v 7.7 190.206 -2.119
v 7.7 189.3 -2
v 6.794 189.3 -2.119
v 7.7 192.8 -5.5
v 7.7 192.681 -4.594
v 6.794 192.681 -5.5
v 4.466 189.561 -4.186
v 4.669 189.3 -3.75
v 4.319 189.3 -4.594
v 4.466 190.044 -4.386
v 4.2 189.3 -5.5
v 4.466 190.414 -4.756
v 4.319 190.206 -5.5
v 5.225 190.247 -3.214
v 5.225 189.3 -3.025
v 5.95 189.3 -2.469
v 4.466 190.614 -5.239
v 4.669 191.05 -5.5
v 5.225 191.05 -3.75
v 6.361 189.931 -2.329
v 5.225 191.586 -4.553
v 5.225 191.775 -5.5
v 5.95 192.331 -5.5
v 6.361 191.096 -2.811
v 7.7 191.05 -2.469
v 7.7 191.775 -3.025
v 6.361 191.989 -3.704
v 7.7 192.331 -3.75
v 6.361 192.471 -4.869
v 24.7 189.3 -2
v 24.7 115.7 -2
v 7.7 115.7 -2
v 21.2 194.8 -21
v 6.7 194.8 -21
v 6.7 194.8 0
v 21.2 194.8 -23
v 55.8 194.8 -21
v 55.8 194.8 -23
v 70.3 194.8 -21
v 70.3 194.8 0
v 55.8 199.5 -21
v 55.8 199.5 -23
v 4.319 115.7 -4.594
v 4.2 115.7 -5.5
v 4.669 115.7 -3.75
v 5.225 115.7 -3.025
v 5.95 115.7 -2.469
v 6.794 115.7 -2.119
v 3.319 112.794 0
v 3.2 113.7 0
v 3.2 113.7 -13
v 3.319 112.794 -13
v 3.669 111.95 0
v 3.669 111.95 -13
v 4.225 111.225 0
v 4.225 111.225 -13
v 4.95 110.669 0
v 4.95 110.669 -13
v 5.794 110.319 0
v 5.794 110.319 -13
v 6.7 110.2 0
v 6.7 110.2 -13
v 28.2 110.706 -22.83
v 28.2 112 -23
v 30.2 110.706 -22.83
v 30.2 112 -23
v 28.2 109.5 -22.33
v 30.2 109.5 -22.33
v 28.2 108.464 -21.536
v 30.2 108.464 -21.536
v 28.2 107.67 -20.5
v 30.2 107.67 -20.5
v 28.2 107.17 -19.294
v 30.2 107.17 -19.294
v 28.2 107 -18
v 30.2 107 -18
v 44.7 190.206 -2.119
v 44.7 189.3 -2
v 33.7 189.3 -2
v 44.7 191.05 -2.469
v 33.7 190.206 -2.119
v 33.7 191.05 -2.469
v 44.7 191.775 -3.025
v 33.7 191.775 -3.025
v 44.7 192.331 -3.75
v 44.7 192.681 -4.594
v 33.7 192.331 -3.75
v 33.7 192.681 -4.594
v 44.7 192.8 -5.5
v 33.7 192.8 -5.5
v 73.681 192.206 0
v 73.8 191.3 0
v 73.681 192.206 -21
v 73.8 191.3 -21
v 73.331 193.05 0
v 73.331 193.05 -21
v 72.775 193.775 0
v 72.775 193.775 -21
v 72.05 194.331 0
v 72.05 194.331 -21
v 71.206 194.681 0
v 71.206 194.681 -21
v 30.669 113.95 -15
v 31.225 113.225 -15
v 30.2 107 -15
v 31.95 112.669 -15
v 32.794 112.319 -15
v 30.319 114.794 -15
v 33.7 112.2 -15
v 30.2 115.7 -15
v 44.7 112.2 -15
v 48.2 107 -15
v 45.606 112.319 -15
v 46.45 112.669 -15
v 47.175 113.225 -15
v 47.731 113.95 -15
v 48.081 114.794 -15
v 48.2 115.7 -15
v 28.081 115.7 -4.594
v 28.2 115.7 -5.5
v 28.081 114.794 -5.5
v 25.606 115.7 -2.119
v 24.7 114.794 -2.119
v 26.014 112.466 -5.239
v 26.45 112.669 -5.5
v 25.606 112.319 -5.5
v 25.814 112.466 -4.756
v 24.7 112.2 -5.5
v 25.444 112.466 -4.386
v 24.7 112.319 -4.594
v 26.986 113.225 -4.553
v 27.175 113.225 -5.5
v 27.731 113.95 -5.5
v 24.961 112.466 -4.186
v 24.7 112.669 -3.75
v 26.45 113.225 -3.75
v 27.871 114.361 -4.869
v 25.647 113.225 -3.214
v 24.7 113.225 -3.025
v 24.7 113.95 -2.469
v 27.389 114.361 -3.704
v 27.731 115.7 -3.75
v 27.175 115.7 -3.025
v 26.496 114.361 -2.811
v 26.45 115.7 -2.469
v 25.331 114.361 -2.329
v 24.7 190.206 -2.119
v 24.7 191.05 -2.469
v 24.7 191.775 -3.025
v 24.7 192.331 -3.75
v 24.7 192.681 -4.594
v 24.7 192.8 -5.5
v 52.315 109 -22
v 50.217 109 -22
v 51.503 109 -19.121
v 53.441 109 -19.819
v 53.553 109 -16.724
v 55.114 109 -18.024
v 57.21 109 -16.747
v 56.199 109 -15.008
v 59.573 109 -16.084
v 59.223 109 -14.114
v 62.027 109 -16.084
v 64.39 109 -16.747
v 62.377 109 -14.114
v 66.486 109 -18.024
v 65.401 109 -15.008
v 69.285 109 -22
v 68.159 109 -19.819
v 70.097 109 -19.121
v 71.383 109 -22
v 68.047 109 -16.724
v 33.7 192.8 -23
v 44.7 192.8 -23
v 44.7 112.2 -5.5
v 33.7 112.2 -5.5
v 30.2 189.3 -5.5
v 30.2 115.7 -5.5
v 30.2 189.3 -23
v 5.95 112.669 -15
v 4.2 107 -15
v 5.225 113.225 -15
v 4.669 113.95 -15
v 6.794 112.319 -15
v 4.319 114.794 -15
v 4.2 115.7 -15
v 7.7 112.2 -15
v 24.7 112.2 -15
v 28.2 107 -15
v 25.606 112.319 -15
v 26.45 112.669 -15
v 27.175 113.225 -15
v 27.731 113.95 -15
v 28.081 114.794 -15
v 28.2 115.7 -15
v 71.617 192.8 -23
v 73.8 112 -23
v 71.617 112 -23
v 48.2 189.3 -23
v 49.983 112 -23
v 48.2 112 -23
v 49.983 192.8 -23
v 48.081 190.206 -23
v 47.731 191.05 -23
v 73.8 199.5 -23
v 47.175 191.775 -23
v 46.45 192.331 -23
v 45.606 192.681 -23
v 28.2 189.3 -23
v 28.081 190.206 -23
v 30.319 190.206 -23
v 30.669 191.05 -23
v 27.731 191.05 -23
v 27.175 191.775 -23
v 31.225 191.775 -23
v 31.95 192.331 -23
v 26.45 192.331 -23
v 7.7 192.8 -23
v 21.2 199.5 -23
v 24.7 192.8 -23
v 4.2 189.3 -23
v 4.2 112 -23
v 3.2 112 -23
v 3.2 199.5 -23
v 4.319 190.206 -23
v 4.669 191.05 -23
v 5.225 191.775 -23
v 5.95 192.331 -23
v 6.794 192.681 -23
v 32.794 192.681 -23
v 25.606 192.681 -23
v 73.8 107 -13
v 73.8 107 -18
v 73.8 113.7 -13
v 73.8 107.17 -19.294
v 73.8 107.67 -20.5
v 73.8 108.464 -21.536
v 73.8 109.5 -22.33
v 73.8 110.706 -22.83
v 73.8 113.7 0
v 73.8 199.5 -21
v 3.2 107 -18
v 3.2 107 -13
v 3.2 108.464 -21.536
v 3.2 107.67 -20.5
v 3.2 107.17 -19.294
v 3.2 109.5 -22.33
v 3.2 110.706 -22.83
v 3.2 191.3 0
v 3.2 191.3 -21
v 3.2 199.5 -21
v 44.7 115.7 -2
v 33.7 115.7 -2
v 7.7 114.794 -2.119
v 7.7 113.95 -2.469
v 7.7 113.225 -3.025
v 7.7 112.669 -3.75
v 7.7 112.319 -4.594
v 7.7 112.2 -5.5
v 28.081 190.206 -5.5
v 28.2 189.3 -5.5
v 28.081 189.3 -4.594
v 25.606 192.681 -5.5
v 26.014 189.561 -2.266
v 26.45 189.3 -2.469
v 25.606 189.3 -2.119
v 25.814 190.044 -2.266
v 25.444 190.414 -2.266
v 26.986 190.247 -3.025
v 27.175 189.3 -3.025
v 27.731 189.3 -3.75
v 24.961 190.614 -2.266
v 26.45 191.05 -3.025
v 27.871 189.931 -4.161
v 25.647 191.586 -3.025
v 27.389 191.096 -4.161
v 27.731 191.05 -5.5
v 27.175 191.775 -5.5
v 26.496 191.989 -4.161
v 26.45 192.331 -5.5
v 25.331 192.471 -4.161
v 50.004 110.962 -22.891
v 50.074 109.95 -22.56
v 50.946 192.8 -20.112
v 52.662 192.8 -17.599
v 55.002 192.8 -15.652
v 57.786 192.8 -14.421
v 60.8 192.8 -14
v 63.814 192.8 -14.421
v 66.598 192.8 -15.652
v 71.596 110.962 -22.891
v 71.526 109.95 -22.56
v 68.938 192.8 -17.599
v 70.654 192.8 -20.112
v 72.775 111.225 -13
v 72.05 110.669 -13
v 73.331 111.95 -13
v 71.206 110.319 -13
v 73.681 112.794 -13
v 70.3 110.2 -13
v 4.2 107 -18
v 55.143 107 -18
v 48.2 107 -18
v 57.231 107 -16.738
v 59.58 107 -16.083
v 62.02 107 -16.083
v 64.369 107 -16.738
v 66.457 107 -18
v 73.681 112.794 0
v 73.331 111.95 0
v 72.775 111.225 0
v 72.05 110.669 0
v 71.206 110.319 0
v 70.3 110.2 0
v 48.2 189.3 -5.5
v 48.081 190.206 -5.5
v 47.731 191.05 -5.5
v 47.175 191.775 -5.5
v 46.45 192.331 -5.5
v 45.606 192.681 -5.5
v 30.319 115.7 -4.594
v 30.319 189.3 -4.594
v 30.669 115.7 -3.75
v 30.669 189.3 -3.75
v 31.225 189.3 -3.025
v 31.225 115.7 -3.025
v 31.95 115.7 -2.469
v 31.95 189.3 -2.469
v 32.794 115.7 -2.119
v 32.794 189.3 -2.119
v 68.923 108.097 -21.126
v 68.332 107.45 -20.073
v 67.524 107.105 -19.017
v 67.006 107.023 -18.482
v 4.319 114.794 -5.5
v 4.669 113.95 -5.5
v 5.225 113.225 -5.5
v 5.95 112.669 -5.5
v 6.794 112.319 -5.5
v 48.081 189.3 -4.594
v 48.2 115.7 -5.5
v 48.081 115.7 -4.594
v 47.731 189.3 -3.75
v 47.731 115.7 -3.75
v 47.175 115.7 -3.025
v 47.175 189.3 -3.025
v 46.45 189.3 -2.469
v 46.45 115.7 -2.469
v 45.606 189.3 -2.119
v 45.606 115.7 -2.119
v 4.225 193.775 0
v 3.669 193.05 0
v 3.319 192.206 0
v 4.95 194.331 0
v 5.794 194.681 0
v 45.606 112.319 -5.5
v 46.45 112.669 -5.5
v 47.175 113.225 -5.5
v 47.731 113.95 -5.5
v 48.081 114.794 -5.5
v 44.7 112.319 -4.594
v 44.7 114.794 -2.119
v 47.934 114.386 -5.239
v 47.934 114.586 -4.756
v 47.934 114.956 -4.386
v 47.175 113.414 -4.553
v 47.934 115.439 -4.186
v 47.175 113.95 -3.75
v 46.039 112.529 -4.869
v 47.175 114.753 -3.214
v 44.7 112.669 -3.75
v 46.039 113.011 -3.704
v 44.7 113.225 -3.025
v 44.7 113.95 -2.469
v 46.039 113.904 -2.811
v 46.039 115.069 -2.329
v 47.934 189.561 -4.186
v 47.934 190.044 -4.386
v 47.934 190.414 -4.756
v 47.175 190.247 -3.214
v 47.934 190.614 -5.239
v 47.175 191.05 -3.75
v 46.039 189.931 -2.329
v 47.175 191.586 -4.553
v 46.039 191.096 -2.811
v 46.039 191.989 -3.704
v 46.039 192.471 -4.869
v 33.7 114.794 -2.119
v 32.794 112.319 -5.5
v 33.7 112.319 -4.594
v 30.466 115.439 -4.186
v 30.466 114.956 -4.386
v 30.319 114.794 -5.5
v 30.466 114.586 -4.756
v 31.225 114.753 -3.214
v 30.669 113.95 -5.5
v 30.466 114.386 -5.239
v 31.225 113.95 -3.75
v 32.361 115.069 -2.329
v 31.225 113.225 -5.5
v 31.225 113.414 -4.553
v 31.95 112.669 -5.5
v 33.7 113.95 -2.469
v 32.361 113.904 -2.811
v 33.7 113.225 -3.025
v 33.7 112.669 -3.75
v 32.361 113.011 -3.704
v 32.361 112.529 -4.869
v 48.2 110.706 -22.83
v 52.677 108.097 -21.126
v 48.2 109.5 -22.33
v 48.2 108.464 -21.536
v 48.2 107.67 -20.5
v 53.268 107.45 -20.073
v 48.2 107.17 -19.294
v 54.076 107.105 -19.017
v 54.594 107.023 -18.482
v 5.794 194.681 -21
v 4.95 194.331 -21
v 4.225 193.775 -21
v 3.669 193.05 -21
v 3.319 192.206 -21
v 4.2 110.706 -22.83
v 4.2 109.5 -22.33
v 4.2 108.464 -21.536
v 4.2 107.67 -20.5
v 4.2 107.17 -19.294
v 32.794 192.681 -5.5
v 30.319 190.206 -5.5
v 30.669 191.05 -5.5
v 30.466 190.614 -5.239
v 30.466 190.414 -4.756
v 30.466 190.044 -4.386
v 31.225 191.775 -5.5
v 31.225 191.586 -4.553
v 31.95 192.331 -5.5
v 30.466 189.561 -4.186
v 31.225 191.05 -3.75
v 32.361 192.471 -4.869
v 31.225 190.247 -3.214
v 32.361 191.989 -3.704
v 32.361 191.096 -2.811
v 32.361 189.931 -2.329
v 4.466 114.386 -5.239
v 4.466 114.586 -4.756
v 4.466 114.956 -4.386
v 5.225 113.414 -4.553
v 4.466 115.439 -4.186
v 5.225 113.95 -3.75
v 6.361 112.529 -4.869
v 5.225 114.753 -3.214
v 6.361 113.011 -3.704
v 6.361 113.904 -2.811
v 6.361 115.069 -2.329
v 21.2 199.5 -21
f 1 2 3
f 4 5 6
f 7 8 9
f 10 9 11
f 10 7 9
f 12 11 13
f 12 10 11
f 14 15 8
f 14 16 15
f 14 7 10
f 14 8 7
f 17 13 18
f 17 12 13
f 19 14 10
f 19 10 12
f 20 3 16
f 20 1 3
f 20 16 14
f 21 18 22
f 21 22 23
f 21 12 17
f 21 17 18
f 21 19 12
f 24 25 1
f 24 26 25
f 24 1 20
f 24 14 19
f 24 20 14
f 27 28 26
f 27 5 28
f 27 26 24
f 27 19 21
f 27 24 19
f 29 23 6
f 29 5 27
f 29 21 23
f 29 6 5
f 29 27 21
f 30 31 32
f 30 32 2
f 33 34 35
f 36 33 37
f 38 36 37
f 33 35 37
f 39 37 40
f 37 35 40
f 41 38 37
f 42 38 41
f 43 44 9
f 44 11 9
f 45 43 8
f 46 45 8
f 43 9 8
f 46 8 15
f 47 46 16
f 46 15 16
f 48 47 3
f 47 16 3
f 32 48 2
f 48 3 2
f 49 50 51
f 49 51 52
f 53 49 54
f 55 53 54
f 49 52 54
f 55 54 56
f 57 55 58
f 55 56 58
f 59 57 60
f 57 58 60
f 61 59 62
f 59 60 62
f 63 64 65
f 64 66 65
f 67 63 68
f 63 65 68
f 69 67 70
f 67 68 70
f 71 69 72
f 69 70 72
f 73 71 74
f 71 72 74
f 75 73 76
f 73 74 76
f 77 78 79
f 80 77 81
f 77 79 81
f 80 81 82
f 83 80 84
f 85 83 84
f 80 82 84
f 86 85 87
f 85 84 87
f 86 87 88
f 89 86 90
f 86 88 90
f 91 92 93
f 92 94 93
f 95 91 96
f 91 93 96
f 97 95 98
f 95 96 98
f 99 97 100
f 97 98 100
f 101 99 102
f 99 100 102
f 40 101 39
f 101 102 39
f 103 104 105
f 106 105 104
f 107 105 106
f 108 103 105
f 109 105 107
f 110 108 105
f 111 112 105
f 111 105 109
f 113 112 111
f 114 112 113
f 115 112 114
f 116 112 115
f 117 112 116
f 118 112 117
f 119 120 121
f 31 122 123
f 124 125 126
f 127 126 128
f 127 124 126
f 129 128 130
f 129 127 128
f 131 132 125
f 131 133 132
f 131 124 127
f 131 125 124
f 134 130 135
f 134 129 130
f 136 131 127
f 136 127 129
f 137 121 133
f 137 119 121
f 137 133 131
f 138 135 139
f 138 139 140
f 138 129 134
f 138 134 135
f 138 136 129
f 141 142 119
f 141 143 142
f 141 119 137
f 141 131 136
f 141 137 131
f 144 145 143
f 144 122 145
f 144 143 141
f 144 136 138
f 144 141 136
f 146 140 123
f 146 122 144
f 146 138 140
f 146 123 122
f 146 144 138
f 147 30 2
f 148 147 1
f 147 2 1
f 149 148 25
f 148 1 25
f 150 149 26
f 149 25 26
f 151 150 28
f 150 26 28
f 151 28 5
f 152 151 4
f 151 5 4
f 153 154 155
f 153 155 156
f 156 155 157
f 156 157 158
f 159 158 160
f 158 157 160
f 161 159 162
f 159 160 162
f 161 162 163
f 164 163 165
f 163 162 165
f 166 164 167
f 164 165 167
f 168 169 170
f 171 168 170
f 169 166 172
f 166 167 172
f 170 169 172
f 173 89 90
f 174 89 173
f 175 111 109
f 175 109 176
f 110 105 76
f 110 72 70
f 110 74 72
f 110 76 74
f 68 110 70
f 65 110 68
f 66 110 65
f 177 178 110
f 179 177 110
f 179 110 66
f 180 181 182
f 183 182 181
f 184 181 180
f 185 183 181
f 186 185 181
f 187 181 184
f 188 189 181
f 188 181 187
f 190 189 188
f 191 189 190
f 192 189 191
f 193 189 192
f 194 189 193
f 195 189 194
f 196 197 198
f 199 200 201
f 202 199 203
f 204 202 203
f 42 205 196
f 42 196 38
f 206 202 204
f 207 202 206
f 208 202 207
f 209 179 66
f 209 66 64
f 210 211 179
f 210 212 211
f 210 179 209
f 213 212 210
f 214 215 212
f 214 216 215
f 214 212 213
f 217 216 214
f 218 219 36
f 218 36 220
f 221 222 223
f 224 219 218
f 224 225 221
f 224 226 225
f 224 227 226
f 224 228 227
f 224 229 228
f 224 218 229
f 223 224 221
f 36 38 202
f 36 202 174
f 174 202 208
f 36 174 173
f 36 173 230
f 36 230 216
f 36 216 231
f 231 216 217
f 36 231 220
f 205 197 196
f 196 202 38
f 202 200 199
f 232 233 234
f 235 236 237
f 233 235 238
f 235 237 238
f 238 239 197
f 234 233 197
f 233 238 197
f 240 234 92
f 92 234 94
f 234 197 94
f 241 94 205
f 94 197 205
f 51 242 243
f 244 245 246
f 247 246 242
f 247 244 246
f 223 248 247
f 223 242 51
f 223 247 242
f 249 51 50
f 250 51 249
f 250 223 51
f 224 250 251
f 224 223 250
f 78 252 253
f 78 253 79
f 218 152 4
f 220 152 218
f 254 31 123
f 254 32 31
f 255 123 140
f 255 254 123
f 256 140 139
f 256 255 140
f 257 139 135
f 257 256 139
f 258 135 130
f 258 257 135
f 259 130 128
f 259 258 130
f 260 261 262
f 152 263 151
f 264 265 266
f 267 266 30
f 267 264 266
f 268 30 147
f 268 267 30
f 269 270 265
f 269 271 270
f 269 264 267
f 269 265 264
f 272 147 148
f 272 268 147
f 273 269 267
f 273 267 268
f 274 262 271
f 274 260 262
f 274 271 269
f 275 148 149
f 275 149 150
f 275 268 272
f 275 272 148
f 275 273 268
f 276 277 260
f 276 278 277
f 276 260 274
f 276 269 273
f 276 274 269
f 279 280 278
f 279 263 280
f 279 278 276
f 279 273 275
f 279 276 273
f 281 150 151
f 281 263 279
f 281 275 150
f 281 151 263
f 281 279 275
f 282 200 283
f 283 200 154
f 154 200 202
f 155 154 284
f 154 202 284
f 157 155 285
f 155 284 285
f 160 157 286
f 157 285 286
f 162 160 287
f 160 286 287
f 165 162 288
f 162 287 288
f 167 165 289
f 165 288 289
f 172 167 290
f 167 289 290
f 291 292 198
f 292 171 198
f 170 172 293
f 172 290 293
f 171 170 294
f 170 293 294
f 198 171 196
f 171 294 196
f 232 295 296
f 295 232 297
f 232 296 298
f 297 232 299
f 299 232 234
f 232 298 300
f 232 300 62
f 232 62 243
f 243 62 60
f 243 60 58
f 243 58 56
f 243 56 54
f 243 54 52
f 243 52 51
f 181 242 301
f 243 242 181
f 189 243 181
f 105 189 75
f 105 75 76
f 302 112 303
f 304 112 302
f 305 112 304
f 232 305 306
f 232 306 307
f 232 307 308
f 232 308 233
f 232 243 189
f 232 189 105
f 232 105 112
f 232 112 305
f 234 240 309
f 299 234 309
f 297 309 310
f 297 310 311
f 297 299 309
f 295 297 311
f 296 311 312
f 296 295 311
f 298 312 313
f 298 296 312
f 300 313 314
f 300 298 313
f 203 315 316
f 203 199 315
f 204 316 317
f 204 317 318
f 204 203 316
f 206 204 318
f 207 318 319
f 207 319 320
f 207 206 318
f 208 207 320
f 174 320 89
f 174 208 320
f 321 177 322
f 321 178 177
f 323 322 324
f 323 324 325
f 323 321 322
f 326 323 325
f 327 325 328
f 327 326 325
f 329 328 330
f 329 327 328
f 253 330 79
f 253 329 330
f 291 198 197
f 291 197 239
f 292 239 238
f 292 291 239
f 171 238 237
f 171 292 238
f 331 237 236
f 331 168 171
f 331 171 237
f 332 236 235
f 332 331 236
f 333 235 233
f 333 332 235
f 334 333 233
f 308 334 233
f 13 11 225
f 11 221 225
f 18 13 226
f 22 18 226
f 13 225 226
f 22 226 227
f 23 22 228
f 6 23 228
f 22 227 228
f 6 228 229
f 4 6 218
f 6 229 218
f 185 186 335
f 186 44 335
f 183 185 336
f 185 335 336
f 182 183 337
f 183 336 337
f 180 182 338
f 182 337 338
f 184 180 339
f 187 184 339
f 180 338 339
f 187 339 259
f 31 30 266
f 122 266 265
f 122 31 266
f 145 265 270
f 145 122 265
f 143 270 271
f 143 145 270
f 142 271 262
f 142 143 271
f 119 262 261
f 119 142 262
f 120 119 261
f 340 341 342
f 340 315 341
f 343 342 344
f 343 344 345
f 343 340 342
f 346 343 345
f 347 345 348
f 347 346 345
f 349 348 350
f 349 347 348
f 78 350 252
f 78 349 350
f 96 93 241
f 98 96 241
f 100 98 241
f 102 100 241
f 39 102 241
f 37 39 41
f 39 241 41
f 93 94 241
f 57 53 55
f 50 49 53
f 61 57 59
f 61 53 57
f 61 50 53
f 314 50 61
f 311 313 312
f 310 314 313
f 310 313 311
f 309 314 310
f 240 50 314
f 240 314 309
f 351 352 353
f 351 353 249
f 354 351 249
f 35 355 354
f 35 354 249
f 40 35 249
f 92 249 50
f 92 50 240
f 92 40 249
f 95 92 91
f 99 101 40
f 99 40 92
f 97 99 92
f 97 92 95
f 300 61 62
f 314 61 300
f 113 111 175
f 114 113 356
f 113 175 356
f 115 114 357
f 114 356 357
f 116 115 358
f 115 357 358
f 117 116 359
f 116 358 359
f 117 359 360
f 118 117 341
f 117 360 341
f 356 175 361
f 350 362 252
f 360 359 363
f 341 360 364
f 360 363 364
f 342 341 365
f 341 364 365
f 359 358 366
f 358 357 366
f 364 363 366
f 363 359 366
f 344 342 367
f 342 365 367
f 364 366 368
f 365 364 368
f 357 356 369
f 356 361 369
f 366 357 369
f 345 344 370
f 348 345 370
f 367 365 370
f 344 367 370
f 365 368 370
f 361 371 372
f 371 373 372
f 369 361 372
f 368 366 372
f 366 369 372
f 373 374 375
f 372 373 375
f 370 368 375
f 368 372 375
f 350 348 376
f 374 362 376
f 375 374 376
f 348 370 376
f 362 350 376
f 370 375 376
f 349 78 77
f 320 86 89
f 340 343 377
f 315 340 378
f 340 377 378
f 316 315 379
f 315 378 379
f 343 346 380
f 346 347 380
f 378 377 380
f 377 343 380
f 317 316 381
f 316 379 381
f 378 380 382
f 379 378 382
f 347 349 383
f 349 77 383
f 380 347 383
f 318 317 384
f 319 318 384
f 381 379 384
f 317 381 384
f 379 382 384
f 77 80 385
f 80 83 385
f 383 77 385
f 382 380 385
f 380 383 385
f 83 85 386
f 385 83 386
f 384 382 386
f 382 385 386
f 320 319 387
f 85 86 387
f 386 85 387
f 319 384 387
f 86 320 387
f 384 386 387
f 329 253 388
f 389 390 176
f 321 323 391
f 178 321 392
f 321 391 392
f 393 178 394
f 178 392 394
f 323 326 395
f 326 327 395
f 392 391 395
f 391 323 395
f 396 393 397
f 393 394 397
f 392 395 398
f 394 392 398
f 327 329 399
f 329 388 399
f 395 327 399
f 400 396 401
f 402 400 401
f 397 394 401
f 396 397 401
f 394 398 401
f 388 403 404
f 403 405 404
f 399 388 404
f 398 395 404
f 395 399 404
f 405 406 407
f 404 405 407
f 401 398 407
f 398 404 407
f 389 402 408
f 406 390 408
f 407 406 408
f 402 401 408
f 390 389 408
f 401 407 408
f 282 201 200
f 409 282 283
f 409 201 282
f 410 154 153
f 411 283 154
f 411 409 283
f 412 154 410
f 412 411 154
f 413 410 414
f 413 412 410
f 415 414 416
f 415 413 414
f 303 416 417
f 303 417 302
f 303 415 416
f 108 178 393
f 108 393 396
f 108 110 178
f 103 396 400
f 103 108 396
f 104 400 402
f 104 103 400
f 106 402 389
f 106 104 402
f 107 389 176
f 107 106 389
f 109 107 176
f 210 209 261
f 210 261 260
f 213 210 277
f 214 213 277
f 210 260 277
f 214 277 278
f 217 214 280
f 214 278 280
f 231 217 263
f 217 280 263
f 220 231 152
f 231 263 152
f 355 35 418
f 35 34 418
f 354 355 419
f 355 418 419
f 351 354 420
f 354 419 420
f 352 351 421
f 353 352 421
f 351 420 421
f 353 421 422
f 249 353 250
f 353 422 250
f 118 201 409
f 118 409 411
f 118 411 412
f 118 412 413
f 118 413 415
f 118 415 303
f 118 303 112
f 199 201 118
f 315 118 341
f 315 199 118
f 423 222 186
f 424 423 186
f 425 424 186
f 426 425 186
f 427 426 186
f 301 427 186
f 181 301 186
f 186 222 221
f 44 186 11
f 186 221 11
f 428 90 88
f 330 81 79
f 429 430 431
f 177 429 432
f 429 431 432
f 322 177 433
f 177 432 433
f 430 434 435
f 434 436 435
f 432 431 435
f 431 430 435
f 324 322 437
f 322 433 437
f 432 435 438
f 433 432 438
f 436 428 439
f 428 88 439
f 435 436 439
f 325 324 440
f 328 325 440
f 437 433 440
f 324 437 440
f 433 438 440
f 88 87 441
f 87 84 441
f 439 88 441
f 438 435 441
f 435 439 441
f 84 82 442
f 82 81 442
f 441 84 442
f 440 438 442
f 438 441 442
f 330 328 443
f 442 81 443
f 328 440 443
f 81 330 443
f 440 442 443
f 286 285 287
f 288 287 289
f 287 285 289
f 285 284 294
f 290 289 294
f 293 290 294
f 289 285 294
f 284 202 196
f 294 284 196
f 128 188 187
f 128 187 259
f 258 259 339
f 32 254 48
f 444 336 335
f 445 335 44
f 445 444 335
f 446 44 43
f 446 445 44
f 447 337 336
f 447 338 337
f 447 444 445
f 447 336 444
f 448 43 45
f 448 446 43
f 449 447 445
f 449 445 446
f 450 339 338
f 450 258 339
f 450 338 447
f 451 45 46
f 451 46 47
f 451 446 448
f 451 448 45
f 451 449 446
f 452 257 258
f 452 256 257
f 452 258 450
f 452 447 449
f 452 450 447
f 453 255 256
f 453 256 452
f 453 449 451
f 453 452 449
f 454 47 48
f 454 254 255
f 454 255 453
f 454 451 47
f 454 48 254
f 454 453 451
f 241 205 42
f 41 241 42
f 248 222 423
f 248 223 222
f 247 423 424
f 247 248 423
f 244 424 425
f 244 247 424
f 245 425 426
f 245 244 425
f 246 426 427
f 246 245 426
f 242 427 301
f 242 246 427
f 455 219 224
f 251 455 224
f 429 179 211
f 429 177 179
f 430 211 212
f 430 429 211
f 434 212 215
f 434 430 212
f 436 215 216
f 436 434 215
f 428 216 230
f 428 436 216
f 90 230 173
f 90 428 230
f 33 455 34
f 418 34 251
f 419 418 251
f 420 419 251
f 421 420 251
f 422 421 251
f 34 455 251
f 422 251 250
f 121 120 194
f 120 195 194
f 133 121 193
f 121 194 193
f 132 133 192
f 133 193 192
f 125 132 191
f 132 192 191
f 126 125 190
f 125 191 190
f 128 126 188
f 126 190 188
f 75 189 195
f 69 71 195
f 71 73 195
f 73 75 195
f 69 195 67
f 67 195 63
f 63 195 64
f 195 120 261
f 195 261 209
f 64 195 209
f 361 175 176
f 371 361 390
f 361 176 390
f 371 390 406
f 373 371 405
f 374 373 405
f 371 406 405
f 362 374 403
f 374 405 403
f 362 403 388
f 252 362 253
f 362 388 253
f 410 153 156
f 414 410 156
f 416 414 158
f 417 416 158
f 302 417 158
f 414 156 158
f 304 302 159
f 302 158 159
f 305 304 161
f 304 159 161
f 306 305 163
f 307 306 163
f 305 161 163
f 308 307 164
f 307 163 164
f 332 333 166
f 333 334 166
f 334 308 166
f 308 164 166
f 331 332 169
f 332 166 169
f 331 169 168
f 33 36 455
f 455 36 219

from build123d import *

# Parameters (mm, degrees)
SKETCH_1_W               = 70.6
SKETCH_1_H               = 84.6
EXTRUDE_1_DEPTH          = 23
SKETCH_2_W               = 18
SKETCH_2_H               = 4.7
EXTRUDE_2_DEPTH          = 2
SKETCH_3_W               = 70.6
SKETCH_3_H               = 3.2
EXTRUDE_3_DEPTH          = 10
CUT_EXTRUDE_START        = -2
SKETCH_4_R               = 11
CUT_EXTRUDE_1_DEPTH      = 115.979827321
EXTRUDE_START            = -2
EXTRUDE_1_2_DEPTH        = 2
DELETE_START             = 107
DELETE_FACE_1_DEPTH      = 2
CUT_EXTRUDE_2_DEPTH      = 1
CUT_EXTRUDE_2_DEPTH_BACK = 43
CUT_EXTRUDE_2_START      = -2
EXTRUDE_START_2          = 24
EXTRUDE_4_DEPTH          = 2
FILLET_1_R               = 5
FILLET_2_R               = 3.5
FILLET_3_R               = 3.5


# Read off the part's stored shape, not the designer's step: 删除面1
with BuildPart() as part:
    # 草图1 → Extrude 1 (new body)
    with BuildSketch(Plane.XY):
        with Locations((38.5, 152.5)):
            Rectangle(SKETCH_1_W, SKETCH_1_H)
    extrude(amount=-EXTRUDE_1_DEPTH)

    # 草图2 → 凸台-拉伸2 (add)
    with BuildSketch(Plane(origin=(0, 0, -23), x_dir=(-1, 0, 0), z_dir=(0, 0, -1))):
        with Locations((-12.2, 197.15)):
            Rectangle(SKETCH_2_W, SKETCH_2_H)
        with Locations((-64.8, 197.15)):
            Rectangle(SKETCH_2_W, SKETCH_2_H)
    extrude(amount=-EXTRUDE_2_DEPTH)

    # 草图3 → 凸台-拉伸3 (add)
    with BuildSketch(Plane(origin=(0, 0, -23), x_dir=(-1, 0, 0), z_dir=(0, 0, -1))):
        with Locations((-38.5, 108.6)):
            Rectangle(SKETCH_3_W, SKETCH_3_H)
    extrude(amount=-EXTRUDE_3_DEPTH)

    # 草图4 → 切除-拉伸1 (cut, through all)
    with BuildSketch(Plane(origin=(0, 194.8, 0), x_dir=(1, 0, 0), z_dir=(0, 1, 0)).offset(CUT_EXTRUDE_START)):
        with Locations((60.8, 25)):
            Circle(SKETCH_4_R)
    extrude(amount=-CUT_EXTRUDE_1_DEPTH, mode=Mode.SUBTRACT)

    # 草图5 → Extrude 1 2 (add)
    with BuildSketch(Plane.XZ.offset(-107).offset(EXTRUDE_START)):
        with BuildLine():
            ThreePointArc((71.616653826, -23), (60.8, -14), (49.983346174, -23))
            Line((49.983346174, -23), (51.950010506, -23.363636364))
            ThreePointArc((51.950010506, -23.363636364), (60.8, -16), (69.649989494, -23.363636364))
            Line((69.649989494, -23.363636364), (71.616653826, -23))
        make_face()
    extrude(amount=EXTRUDE_1_2_DEPTH)

    # Delete Face 1 outline → Delete Face 1 (cut)
    with BuildSketch(Plane(origin=(0, 0, 0), x_dir=(1, 0, 0), z_dir=(0, 1, 0)).offset(DELETE_START)):
        with BuildLine():
            Line((49.983346174, 23), (52.025035613, 23))
            ThreePointArc((52.025035613, 23), (51.985647631, 23.181431245), (51.950010506, 23.363636364))
            Line((51.950010506, 23.363636364), (49.983346174, 23))
        make_face()
        with BuildLine():
            Line((71.616653826, 23), (69.649989494, 23.363636364))
            ThreePointArc((69.649989494, 23.363636364), (69.614352369, 23.181431245), (69.574964387, 23))
            Line((69.574964387, 23), (71.616653826, 23))
        make_face()
    extrude(amount=DELETE_FACE_1_DEPTH, mode=Mode.SUBTRACT)

    # 草图6 → 切除-拉伸2 (cut, two sides: drawn at the far end of the back side and taken through both)
    with BuildSketch(Plane.ZY.offset(-3.2).offset(CUT_EXTRUDE_2_START - CUT_EXTRUDE_2_DEPTH_BACK)):
        Polygon((-23, 107), (-15, 107), (-15, 112.2), (-2, 112.2), (-2, 192.8), (-23, 192.8), align=None)
    extrude(amount=CUT_EXTRUDE_2_DEPTH + CUT_EXTRUDE_2_DEPTH_BACK, mode=Mode.SUBTRACT)

    # 草图7 → 凸台-拉伸4 (add)
    with BuildSketch(Plane(origin=(4.2, 0, 0), x_dir=(0, 0, -1), z_dir=(1, 0, 0)).offset(EXTRUDE_START_2)):
        Polygon((23, 107), (23, 192.8), (2, 192.8), (2, 112.2), (15, 112.2), (15, 107), align=None)
    extrude(amount=EXTRUDE_4_DEPTH)

    # 圆角1
    fillet_1_edges = [part.edges().sort_by_distance(p)[0] for p in [
        (71.687482194, 107, -23),
        (50.112517807, 107, -23),
        (29.2, 107, -23),
        (3.7, 107, -23),
    ]]
    fillet(fillet_1_edges, radius=FILLET_1_R)

    # 圆角2
    fillet_2_edges = [part.edges().sort_by_distance(p)[0] for p in [
        (73.8, 194.8, -10.5),
        (3.2, 194.8, -10.5),
        (3.2, 110.2, -6.5),
        (73.8, 110.2, -6.5),
    ]]
    fillet(fillet_2_edges, radius=FILLET_2_R)

    # 圆角3
    fillet_3_edges = [part.edges().sort_by_distance(p)[0] for p in [
        (39.2, 192.8, -2),
        (39.2, 112.2, -2),
        (28.2, 192.8, -12.5),
        (28.2, 152.5, -2),
        (28.2, 112.2, -8.5),
        (30.2, 192.8, -12.5),
        (30.2, 152.5, -2),
        (30.2, 112.2, -8.5),
        (48.2, 112.2, -8.5),
        (16.2, 112.2, -2),
        (48.2, 152.5, -2),
        (16.2, 192.8, -2),
        (48.2, 192.8, -12.5),
        (4.2, 112.2, -8.5),
        (4.2, 152.5, -2),
        (4.2, 192.8, -12.5),
    ]]
    fillet(fillet_3_edges, radius=FILLET_3_R)


solid = part.part
